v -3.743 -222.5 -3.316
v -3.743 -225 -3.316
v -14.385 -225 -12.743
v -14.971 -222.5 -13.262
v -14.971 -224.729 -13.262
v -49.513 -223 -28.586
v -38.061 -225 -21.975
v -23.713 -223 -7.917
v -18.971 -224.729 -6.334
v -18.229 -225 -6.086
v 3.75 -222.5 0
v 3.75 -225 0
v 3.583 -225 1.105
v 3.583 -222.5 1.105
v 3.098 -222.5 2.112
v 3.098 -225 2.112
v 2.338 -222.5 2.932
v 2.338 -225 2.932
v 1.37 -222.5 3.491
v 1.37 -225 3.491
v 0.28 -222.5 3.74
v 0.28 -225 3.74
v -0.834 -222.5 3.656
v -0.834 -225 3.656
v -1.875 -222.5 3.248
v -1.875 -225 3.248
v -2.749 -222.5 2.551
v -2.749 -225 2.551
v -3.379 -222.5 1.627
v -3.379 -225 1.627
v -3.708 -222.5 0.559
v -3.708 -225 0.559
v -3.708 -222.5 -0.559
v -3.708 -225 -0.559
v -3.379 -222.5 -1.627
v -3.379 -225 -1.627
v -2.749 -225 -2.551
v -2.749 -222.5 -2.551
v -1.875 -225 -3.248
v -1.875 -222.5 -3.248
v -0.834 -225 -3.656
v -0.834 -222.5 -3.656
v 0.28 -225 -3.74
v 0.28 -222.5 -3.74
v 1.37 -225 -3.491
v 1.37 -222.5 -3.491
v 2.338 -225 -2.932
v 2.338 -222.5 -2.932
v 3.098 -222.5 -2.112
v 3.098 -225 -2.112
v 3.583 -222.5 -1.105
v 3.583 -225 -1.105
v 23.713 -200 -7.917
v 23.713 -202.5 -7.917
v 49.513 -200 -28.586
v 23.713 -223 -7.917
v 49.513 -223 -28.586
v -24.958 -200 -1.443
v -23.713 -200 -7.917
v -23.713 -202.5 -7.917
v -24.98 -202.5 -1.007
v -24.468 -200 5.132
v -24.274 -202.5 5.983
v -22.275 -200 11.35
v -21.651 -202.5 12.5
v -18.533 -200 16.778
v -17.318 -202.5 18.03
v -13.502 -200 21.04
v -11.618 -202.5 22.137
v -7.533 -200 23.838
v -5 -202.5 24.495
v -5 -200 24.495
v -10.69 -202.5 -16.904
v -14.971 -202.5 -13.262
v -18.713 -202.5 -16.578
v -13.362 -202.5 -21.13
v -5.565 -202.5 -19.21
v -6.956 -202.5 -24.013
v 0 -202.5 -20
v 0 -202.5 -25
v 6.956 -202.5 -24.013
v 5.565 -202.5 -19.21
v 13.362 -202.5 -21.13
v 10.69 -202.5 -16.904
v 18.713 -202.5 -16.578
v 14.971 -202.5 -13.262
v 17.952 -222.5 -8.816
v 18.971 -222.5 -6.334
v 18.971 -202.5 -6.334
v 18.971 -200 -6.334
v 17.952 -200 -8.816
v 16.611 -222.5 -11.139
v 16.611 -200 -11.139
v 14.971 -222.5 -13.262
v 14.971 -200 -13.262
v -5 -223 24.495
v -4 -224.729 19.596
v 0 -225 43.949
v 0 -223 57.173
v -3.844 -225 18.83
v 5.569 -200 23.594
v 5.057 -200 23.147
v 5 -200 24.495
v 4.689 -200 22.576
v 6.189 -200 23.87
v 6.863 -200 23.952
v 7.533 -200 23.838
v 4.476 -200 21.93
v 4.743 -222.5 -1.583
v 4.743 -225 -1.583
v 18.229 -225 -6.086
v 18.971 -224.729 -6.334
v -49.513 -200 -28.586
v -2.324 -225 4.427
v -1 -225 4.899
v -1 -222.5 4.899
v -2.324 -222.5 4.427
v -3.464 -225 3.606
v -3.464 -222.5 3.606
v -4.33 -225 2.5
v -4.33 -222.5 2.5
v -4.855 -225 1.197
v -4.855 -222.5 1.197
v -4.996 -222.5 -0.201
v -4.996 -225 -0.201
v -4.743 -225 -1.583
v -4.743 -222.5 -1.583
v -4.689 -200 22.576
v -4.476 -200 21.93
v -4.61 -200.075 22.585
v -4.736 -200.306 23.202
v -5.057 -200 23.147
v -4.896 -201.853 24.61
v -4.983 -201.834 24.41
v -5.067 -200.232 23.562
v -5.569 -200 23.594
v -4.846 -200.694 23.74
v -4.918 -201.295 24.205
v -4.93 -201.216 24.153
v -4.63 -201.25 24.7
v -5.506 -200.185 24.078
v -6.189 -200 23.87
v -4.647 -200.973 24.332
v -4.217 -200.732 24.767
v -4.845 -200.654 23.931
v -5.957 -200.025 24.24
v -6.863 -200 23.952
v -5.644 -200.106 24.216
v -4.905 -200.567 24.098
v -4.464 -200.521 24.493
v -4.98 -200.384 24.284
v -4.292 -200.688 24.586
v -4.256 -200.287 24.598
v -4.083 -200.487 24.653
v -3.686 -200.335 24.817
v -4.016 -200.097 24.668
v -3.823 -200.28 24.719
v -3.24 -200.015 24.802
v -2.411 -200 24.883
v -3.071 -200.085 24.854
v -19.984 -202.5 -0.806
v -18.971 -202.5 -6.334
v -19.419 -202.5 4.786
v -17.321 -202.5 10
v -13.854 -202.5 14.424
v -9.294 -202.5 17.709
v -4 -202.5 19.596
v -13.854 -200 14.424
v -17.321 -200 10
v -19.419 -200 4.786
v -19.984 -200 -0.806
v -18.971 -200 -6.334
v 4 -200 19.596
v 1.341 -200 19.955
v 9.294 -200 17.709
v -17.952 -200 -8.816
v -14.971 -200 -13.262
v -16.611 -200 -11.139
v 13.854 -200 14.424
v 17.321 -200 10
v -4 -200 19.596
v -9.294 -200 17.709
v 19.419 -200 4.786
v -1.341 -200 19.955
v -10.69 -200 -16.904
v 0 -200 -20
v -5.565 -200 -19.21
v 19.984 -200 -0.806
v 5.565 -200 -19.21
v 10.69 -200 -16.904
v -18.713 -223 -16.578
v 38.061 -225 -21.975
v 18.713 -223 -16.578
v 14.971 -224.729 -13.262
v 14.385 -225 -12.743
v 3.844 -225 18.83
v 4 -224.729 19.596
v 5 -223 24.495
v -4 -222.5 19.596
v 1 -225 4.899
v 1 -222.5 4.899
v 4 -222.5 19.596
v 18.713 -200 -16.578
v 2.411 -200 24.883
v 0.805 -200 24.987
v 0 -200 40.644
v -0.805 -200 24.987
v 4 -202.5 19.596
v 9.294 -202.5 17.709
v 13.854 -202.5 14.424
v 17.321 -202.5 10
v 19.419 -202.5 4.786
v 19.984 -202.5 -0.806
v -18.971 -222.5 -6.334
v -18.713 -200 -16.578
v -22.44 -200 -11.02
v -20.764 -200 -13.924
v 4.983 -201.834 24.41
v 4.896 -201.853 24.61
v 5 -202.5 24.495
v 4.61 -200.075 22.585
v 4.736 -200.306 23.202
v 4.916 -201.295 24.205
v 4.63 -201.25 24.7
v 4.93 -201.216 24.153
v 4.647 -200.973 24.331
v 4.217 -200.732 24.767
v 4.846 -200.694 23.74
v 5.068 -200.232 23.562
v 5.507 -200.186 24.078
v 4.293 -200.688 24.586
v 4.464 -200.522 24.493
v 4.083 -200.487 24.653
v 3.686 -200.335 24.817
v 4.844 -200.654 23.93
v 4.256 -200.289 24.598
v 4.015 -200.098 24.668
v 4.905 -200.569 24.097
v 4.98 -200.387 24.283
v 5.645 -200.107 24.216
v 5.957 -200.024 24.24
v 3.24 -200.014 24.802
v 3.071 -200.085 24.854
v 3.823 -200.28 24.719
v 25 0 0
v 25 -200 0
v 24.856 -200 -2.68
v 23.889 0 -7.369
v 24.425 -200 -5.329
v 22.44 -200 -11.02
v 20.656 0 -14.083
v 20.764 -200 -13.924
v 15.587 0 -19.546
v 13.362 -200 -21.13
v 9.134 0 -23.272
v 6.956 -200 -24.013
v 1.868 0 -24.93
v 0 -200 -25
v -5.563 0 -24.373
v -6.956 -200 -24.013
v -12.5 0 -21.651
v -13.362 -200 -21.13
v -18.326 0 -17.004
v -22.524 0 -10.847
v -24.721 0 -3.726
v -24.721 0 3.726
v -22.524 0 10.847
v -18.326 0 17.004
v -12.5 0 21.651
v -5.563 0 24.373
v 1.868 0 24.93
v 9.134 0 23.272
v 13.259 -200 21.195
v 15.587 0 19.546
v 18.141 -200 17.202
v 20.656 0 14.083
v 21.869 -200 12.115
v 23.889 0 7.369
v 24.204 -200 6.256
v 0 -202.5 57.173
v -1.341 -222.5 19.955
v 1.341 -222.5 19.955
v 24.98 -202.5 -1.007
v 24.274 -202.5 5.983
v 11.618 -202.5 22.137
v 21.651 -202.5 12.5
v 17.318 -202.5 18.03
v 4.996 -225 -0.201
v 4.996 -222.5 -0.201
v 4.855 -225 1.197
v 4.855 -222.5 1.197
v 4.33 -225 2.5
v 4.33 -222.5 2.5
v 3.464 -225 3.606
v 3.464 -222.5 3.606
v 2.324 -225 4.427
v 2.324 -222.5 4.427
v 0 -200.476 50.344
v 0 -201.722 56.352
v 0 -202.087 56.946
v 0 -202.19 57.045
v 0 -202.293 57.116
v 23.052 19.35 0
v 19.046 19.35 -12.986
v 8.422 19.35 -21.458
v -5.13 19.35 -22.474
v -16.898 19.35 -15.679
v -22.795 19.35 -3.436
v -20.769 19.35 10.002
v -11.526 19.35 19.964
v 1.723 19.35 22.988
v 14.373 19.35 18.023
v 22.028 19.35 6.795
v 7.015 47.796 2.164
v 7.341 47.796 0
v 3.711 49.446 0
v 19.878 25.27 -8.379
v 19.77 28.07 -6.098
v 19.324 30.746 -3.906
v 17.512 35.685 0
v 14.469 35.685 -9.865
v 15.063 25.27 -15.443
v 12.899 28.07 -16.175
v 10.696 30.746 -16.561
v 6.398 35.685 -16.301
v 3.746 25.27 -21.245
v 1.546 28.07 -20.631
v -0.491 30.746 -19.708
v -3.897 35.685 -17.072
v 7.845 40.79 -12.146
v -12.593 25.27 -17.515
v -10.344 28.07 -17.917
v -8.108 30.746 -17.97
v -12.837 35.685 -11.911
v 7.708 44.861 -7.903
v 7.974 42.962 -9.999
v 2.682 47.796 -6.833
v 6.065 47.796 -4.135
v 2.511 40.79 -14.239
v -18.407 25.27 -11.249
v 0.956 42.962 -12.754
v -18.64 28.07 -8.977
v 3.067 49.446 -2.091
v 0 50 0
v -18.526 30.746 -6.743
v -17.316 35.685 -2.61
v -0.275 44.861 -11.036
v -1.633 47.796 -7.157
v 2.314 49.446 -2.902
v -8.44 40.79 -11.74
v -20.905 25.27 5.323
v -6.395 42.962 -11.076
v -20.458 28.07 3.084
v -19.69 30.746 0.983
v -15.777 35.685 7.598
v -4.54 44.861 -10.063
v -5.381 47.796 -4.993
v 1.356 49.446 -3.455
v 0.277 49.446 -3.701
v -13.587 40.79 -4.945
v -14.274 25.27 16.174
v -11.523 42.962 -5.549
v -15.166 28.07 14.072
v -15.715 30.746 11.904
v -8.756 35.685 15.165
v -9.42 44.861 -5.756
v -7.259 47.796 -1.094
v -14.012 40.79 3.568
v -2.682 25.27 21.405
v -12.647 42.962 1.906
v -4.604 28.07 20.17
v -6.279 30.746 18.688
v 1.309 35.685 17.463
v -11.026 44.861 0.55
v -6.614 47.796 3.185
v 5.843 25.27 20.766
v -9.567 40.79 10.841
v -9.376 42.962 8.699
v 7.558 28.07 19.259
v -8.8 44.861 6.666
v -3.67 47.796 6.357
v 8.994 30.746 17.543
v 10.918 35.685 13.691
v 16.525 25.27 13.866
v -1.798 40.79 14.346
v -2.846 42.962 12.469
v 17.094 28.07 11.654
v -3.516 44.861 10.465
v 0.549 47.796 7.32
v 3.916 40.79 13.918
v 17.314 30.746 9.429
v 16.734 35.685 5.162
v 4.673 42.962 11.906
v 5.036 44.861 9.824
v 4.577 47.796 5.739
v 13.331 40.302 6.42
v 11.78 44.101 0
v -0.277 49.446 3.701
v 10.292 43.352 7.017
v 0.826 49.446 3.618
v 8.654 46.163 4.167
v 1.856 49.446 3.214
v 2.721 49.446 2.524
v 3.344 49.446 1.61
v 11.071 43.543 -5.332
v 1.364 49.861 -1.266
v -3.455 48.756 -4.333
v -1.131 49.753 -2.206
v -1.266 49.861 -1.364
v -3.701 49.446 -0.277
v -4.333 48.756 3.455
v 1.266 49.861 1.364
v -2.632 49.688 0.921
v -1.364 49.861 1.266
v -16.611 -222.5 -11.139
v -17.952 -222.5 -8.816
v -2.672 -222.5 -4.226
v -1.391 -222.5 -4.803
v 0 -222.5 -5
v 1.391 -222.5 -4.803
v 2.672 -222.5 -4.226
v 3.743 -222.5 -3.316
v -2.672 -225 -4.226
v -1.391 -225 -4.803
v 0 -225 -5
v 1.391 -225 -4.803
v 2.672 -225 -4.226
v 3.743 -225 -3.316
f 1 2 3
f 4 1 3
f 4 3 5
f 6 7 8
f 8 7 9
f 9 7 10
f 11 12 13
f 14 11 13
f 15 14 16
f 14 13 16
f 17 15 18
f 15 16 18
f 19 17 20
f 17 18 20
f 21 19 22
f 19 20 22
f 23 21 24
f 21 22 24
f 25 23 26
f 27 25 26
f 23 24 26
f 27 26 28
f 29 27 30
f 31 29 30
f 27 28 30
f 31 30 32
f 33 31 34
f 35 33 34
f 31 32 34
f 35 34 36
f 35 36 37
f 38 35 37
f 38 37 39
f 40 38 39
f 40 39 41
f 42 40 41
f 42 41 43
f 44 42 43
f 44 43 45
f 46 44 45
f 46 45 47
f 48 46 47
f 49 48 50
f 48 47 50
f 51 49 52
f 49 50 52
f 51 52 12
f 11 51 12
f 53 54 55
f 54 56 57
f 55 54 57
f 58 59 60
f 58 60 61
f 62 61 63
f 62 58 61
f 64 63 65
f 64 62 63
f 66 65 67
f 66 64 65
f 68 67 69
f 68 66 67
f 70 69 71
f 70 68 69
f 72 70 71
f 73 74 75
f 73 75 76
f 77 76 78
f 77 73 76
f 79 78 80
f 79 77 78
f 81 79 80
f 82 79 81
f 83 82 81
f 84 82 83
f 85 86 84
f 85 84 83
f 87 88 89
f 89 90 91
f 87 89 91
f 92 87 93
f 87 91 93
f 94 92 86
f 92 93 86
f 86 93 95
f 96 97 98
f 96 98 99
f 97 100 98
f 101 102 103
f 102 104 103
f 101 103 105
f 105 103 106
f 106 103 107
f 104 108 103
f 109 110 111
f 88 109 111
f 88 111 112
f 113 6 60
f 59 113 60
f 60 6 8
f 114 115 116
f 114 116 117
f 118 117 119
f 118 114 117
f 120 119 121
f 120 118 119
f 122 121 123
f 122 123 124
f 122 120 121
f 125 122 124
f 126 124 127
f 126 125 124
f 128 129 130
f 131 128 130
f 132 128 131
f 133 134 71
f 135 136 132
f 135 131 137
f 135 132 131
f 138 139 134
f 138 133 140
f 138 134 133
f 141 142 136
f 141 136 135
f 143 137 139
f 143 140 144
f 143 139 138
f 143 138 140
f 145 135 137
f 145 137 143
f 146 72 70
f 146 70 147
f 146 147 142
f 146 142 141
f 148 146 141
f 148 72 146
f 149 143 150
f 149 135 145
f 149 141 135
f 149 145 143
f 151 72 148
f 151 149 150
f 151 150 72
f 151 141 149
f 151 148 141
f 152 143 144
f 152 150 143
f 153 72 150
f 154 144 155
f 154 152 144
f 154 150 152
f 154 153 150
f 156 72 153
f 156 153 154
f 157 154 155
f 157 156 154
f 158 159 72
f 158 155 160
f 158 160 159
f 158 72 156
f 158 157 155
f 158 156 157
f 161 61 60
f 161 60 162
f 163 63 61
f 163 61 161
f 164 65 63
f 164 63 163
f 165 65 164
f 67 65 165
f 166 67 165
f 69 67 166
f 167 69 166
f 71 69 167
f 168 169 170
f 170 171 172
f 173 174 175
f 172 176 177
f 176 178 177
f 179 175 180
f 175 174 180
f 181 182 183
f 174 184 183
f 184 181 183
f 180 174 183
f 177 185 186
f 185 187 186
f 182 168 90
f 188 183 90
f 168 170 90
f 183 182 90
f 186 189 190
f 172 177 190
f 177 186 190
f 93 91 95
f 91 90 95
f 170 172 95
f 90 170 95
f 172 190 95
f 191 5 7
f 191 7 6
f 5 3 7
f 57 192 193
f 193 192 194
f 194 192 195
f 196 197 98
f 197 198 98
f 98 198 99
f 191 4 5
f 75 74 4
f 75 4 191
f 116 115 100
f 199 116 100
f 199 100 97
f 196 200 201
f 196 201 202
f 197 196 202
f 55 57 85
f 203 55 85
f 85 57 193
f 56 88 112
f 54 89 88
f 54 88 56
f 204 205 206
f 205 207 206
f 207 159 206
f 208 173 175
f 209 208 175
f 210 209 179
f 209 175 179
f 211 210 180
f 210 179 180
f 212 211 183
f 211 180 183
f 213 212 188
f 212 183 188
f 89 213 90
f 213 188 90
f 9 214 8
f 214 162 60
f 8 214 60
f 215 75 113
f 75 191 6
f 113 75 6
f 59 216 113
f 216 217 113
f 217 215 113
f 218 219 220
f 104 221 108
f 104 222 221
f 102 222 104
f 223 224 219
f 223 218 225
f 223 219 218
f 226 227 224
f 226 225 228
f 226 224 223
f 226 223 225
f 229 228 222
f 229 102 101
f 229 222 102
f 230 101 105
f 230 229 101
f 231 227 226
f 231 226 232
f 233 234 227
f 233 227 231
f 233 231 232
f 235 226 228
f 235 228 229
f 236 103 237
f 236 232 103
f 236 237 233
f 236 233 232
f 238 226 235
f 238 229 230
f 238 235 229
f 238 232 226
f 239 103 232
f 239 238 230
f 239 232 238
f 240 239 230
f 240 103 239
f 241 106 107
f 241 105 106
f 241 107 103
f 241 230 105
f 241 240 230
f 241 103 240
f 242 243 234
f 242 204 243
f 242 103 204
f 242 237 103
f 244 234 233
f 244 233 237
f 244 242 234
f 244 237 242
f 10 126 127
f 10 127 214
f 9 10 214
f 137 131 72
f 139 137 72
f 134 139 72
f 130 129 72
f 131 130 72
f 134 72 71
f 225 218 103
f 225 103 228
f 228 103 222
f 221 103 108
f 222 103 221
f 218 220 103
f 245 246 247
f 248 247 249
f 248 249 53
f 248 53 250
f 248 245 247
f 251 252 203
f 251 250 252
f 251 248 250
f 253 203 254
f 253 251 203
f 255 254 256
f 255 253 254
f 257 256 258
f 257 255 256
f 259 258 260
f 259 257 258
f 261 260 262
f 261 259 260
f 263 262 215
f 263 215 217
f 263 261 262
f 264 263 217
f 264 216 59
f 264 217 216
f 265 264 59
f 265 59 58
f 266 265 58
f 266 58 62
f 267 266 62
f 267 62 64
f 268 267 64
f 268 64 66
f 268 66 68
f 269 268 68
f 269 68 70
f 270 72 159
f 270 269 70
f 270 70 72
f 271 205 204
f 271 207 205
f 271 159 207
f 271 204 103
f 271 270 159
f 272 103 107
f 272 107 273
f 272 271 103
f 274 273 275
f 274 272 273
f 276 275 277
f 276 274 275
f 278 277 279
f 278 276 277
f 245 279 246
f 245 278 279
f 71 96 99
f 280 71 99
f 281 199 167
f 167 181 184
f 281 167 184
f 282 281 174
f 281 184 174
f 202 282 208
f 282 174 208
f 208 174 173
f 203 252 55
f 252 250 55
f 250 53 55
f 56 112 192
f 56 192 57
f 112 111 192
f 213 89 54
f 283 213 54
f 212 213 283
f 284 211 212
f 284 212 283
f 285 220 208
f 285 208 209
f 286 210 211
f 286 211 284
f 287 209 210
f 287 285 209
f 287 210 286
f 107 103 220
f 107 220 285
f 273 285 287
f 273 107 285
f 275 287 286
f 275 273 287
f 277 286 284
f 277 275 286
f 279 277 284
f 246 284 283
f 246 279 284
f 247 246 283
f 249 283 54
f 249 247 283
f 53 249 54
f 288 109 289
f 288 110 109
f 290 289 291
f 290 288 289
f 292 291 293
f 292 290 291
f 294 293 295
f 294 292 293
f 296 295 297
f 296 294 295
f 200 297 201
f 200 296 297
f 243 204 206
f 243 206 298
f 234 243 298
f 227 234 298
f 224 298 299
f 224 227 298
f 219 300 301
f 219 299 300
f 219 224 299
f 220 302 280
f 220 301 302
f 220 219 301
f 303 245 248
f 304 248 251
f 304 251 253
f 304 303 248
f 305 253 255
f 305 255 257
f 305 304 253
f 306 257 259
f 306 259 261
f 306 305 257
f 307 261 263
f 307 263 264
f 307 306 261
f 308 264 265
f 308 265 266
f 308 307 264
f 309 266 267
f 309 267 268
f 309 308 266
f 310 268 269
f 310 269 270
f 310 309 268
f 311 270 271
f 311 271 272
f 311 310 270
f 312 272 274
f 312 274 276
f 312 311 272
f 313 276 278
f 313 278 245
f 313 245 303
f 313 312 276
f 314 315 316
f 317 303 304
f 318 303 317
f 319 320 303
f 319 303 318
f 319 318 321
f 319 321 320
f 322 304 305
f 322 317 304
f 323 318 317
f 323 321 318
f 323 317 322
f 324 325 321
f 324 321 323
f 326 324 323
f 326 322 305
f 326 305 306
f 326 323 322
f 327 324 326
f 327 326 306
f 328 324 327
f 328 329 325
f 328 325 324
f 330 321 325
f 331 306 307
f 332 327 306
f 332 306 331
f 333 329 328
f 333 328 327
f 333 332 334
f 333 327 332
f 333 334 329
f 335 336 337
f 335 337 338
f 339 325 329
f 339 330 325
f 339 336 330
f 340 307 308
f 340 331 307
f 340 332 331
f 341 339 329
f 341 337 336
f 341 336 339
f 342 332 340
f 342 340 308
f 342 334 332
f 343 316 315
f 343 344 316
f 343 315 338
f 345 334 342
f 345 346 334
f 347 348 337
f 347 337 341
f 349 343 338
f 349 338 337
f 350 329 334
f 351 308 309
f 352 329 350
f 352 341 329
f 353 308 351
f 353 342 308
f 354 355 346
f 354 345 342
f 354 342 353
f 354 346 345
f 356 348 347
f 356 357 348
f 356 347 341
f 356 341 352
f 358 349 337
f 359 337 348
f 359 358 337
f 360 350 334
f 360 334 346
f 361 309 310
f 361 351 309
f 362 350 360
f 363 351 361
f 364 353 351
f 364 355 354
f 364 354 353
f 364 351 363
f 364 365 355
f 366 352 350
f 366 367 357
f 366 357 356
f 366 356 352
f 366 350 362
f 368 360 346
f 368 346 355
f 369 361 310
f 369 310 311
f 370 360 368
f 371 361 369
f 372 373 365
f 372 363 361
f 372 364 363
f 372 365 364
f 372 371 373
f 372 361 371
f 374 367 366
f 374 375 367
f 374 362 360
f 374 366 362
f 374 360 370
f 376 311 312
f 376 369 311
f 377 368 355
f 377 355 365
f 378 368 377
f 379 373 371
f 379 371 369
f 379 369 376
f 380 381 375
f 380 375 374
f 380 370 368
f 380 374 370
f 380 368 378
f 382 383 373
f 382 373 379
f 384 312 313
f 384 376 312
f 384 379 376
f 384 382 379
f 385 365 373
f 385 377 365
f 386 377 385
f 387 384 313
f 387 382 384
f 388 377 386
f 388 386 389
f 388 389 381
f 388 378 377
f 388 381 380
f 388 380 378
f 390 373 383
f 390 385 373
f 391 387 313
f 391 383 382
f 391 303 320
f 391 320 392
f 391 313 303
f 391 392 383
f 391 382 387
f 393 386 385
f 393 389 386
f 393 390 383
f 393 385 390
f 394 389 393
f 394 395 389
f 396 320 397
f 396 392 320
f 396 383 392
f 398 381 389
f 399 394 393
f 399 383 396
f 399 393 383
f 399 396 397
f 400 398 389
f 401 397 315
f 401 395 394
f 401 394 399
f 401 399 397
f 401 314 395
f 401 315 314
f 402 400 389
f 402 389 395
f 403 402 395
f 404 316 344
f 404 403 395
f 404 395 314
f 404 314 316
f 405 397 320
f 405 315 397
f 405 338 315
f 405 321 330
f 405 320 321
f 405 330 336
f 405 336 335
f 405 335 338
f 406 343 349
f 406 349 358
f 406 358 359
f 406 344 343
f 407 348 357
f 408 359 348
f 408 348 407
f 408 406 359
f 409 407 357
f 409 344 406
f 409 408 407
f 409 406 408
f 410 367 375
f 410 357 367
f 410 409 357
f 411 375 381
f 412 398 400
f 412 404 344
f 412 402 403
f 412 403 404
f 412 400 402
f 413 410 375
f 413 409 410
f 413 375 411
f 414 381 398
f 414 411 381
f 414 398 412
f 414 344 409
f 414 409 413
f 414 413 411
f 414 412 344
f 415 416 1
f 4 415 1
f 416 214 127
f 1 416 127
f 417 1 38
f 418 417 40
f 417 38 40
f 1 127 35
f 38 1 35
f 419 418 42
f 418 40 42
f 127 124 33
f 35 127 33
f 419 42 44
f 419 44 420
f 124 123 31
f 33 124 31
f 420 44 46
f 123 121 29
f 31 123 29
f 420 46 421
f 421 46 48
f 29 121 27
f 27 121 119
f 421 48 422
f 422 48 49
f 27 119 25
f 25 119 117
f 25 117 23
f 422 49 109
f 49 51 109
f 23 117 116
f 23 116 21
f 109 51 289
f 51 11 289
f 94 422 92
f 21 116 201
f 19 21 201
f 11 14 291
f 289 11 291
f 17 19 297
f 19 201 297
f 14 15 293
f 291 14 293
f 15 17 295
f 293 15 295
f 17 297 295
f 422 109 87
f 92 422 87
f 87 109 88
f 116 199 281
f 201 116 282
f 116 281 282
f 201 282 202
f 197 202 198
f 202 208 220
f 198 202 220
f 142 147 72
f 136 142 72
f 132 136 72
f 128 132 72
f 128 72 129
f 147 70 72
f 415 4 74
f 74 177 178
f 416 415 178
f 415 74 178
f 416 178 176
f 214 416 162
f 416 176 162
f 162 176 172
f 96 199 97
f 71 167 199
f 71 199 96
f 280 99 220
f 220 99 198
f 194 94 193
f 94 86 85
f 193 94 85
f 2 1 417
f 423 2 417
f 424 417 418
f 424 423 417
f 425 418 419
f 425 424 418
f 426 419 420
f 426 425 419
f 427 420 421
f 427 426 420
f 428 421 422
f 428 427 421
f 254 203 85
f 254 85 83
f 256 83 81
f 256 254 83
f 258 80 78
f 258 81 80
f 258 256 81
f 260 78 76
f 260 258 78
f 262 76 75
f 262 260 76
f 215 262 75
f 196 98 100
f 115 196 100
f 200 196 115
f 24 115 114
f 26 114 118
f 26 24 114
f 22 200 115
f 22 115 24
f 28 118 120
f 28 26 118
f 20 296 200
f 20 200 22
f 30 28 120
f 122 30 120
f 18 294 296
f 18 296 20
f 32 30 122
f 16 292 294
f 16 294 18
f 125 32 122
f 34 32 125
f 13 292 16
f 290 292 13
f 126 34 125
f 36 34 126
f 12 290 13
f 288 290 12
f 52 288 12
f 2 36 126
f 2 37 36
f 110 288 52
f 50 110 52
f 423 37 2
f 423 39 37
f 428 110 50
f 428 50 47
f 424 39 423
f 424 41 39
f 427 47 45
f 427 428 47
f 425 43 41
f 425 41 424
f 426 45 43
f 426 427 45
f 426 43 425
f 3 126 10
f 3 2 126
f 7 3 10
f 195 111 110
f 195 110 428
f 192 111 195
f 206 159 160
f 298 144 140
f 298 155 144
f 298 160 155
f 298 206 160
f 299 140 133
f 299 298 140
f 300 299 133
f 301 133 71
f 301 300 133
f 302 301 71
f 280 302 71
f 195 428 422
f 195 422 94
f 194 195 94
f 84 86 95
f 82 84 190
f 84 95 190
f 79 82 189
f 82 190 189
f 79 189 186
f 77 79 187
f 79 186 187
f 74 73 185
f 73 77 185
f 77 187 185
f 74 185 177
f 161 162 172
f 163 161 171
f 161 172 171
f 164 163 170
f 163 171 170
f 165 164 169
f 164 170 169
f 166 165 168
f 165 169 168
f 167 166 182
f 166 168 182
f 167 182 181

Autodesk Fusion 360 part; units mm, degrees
sketch "Sketch1" plane through (0, 0, 0) normal (0, 0, 1) x (1, 0, 0)
  ellipse E0 centre (0, 0) end of major axis (0, 50) minor radius 25
  line L0 (0, -50) -> (0, 50)
  line L1 (25, 0) -> (-25, 0)
  line L2 (-25, 0) -> (25, 0)
  line L3 (0, 0) -> (0, 50)
  dimension "d1" = 100
  dimension "d2" = 50
revolve "Revolve1" add sketch "Sketch1" angle 360 about axis through (0, 0, 0) along (0, 1, 0) contours E0 L0 L1 L2 L3 picked at (5.2231, 29.6534)
extrude "Extrude1" add 1 faces at (-6.7759, 0, 1.242) along direction (0, -1, 0) blind 200
sketch "Sketch2" plane through (0, -200, 0) normal (0, -1, 0) x (1, 0, 0)
  circle A0 centre (0, 0) radius 25
  circle A1 centre (0, 0) radius 20
  line L0 (0, 0) -> (0, 25) construction
  line L1 (0, 0) -> (-5, 24.4949)
  line L2 (0, 0) -> (5, 24.4949)
  line L3 (0, 0) -> (-23.7132, -7.9173)
  line L4 (0, 0) -> (-18.7132, -16.5776)
  line L5 (0, 0) -> (18.7132, -16.5776)
  line L6 (0, 0) -> (23.7132, -7.9173)
  dimension "d6" = 40
  dimension "d9" = 10
  dimension "d10" = 5
  dimension "d12" = 360
extrude "Extrude2" add sketch "Sketch2" along normal blind 25 contours A0 A1 L1 L2 | A0 A1 L5 L6 | A0 A1 L3 L4
sketch "Sketch3" plane through (0, -225, 0) normal (0, -1, 0) x (1, 0, 0)
  line L0 (4, 19.5959) -> (5, 24.4949)
  arc A0 (5, 24.4949) -> (-5, 24.4949) centre (0, 0) ccw
  line L1 (-5, 24.4949) -> (-4, 19.5959)
  arc A1 (4, 19.5959) -> (-4, 19.5959) centre (0, 0) ccw
  circle A2 centre (0, 0) radius 5
  line L2 (0, 0) -> (-4, 19.5959)
  line L3 (0, 0) -> (4, 19.5959)
  arc A3 (-23.7132, -7.9173) -> (-18.7132, -16.5776) centre (0, 0) ccw
  line L4 (-18.7132, -16.5776) -> (-14.9706, -13.2621)
  arc A4 (-18.9706, -6.3339) -> (-14.9706, -13.2621) centre (0, 0) ccw
  line L5 (-18.9706, -6.3339) -> (-23.7132, -7.9173)
  arc A5 (18.7132, -16.5776) -> (23.7132, -7.9173) centre (0, 0) ccw
  line L6 (23.7132, -7.9173) -> (18.9706, -6.3339)
  arc A6 (14.9706, -13.2621) -> (18.9706, -6.3339) centre (0, 0) ccw
  line L7 (14.9706, -13.2621) -> (18.7132, -16.5776)
  line L8 (0, 0) -> (-18.9706, -6.3339)
  line L9 (0, 0) -> (-14.9706, -13.2621)
  line L10 (0, 0) -> (14.9706, -13.2621)
  line L11 (0, 0) -> (18.9706, -6.3339)
  circle A7 centre (0, 0) radius 3.75
  dimension "d15" = 10
  dimension "d16" = 7.5
extrude "Extrude3" add sketch "Sketch3" against normal blind 2.5 contours A1 A2 L2 L3 | A2 L2 L3 A7 | A2 L3 L11 A7 | A2 L2 L8 A7 | A2 L8 L9 A7 | A2 A4 L8 L9 | A2 A6 L10 L11 | A2 L10 L11 A7 | A2 L9 L10 A7
sketch "Sketch4" plane through (0, -225, 0) normal (0, -1, 0) x (1, 0, 0)
  circle A0 centre (0, 0) radius 3.75
  arc A1 (18.7132, -16.5776) -> (23.7132, -7.9173) centre (0, 0) ccw
  line L0 (23.7132, -7.9173) -> (4.7426, -1.5835)
  arc A2 (4.7426, -1.5835) -> (1, 4.899) centre (0, 0) ccw
  line L1 (1, 4.899) -> (5, 24.4949)
  arc A3 (5, 24.4949) -> (-5, 24.4949) centre (0, 0) ccw
  line L2 (-5, 24.4949) -> (-1, 4.899)
  arc A4 (-1, 4.899) -> (-4.7426, -1.5835) centre (0, 0) ccw
  line L3 (-4.7426, -1.5835) -> (-23.7132, -7.9173)
  arc A5 (-23.7132, -7.9173) -> (-18.7132, -16.5776) centre (0, 0) ccw
  line L4 (-18.7132, -16.5776) -> (-3.7426, -3.3155)
  arc A6 (-3.7426, -3.3155) -> (3.7426, -3.3155) centre (0, 0) ccw
  line L5 (3.7426, -3.3155) -> (18.7132, -16.5776)
  line L6 (-5, 24.4949) -> (0, 57.1727)
  line L7 (0, 57.1727) -> (5, 24.4949)
extrude "Extrude4" add sketch "Sketch4" against normal up to surface (25 mm away) contours A3 L6 L7
fillet "Fillet1" radius 2.5 2 edges at (-2.5, -200, 40.8338) (2.5, -200, 40.8338)
chamfer "Chamfer1" distance 2 angle 45 2 edges at (-2.5, -225, 40.8338) (2.5, -225, 40.8338)
pattern_circular "C-Pattern1" count 3 over 360 about axis through (0, 0, 0) along (0, -1, 0) of "Extrude4", "Chamfer1"
sketch "Sketch5" plane through (0, -200, 0) normal (0, -1, 0) x (1, 0, 0)
  line L0 (-14.9706, -13.2621) -> (-18.7132, -16.5776)
  arc A0 (-18.7132, -16.5776) -> (18.7132, -16.5776) centre (0, 0) ccw
  line L1 (18.7132, -16.5776) -> (14.9706, -13.2621)
  arc A1 (14.9706, -13.2621) -> (18.9706, -6.3339) centre (0, 0) ccw
  line L2 (18.9706, -6.3339) -> (23.7132, -7.9173)
  arc A2 (23.7132, -7.9173) -> (5, 24.4949) centre (0, 0) ccw
  line L3 (5, 24.4949) -> (4, 19.5959)
  arc A3 (4, 19.5959) -> (-4, 19.5959) centre (0, 0) ccw
  line L4 (-4, 19.5959) -> (-5, 24.4949)
  arc A4 (-5, 24.4949) -> (-23.7132, -7.9173) centre (0, 0) ccw
  line L5 (-23.7132, -7.9173) -> (-18.9706, -6.3339)
  arc A5 (-18.9706, -6.3339) -> (-14.9706, -13.2621) centre (0, 0) ccw
  arc A6 (-18.9706, -6.3339) -> (-14.9706, -13.2621) centre (0, 0) ccw
  circle A7 centre (0, 0) radius 20
extrude "Extrude5" add sketch "Sketch5" along normal blind 2.5 contours L0 A0 L1 A7 | L4 A4 L5 A7 | L2 A2 L3 A7
equation "d7 = ( 360 / 3 ) * 1 deg"
equation "d10 = d9 / 2"
